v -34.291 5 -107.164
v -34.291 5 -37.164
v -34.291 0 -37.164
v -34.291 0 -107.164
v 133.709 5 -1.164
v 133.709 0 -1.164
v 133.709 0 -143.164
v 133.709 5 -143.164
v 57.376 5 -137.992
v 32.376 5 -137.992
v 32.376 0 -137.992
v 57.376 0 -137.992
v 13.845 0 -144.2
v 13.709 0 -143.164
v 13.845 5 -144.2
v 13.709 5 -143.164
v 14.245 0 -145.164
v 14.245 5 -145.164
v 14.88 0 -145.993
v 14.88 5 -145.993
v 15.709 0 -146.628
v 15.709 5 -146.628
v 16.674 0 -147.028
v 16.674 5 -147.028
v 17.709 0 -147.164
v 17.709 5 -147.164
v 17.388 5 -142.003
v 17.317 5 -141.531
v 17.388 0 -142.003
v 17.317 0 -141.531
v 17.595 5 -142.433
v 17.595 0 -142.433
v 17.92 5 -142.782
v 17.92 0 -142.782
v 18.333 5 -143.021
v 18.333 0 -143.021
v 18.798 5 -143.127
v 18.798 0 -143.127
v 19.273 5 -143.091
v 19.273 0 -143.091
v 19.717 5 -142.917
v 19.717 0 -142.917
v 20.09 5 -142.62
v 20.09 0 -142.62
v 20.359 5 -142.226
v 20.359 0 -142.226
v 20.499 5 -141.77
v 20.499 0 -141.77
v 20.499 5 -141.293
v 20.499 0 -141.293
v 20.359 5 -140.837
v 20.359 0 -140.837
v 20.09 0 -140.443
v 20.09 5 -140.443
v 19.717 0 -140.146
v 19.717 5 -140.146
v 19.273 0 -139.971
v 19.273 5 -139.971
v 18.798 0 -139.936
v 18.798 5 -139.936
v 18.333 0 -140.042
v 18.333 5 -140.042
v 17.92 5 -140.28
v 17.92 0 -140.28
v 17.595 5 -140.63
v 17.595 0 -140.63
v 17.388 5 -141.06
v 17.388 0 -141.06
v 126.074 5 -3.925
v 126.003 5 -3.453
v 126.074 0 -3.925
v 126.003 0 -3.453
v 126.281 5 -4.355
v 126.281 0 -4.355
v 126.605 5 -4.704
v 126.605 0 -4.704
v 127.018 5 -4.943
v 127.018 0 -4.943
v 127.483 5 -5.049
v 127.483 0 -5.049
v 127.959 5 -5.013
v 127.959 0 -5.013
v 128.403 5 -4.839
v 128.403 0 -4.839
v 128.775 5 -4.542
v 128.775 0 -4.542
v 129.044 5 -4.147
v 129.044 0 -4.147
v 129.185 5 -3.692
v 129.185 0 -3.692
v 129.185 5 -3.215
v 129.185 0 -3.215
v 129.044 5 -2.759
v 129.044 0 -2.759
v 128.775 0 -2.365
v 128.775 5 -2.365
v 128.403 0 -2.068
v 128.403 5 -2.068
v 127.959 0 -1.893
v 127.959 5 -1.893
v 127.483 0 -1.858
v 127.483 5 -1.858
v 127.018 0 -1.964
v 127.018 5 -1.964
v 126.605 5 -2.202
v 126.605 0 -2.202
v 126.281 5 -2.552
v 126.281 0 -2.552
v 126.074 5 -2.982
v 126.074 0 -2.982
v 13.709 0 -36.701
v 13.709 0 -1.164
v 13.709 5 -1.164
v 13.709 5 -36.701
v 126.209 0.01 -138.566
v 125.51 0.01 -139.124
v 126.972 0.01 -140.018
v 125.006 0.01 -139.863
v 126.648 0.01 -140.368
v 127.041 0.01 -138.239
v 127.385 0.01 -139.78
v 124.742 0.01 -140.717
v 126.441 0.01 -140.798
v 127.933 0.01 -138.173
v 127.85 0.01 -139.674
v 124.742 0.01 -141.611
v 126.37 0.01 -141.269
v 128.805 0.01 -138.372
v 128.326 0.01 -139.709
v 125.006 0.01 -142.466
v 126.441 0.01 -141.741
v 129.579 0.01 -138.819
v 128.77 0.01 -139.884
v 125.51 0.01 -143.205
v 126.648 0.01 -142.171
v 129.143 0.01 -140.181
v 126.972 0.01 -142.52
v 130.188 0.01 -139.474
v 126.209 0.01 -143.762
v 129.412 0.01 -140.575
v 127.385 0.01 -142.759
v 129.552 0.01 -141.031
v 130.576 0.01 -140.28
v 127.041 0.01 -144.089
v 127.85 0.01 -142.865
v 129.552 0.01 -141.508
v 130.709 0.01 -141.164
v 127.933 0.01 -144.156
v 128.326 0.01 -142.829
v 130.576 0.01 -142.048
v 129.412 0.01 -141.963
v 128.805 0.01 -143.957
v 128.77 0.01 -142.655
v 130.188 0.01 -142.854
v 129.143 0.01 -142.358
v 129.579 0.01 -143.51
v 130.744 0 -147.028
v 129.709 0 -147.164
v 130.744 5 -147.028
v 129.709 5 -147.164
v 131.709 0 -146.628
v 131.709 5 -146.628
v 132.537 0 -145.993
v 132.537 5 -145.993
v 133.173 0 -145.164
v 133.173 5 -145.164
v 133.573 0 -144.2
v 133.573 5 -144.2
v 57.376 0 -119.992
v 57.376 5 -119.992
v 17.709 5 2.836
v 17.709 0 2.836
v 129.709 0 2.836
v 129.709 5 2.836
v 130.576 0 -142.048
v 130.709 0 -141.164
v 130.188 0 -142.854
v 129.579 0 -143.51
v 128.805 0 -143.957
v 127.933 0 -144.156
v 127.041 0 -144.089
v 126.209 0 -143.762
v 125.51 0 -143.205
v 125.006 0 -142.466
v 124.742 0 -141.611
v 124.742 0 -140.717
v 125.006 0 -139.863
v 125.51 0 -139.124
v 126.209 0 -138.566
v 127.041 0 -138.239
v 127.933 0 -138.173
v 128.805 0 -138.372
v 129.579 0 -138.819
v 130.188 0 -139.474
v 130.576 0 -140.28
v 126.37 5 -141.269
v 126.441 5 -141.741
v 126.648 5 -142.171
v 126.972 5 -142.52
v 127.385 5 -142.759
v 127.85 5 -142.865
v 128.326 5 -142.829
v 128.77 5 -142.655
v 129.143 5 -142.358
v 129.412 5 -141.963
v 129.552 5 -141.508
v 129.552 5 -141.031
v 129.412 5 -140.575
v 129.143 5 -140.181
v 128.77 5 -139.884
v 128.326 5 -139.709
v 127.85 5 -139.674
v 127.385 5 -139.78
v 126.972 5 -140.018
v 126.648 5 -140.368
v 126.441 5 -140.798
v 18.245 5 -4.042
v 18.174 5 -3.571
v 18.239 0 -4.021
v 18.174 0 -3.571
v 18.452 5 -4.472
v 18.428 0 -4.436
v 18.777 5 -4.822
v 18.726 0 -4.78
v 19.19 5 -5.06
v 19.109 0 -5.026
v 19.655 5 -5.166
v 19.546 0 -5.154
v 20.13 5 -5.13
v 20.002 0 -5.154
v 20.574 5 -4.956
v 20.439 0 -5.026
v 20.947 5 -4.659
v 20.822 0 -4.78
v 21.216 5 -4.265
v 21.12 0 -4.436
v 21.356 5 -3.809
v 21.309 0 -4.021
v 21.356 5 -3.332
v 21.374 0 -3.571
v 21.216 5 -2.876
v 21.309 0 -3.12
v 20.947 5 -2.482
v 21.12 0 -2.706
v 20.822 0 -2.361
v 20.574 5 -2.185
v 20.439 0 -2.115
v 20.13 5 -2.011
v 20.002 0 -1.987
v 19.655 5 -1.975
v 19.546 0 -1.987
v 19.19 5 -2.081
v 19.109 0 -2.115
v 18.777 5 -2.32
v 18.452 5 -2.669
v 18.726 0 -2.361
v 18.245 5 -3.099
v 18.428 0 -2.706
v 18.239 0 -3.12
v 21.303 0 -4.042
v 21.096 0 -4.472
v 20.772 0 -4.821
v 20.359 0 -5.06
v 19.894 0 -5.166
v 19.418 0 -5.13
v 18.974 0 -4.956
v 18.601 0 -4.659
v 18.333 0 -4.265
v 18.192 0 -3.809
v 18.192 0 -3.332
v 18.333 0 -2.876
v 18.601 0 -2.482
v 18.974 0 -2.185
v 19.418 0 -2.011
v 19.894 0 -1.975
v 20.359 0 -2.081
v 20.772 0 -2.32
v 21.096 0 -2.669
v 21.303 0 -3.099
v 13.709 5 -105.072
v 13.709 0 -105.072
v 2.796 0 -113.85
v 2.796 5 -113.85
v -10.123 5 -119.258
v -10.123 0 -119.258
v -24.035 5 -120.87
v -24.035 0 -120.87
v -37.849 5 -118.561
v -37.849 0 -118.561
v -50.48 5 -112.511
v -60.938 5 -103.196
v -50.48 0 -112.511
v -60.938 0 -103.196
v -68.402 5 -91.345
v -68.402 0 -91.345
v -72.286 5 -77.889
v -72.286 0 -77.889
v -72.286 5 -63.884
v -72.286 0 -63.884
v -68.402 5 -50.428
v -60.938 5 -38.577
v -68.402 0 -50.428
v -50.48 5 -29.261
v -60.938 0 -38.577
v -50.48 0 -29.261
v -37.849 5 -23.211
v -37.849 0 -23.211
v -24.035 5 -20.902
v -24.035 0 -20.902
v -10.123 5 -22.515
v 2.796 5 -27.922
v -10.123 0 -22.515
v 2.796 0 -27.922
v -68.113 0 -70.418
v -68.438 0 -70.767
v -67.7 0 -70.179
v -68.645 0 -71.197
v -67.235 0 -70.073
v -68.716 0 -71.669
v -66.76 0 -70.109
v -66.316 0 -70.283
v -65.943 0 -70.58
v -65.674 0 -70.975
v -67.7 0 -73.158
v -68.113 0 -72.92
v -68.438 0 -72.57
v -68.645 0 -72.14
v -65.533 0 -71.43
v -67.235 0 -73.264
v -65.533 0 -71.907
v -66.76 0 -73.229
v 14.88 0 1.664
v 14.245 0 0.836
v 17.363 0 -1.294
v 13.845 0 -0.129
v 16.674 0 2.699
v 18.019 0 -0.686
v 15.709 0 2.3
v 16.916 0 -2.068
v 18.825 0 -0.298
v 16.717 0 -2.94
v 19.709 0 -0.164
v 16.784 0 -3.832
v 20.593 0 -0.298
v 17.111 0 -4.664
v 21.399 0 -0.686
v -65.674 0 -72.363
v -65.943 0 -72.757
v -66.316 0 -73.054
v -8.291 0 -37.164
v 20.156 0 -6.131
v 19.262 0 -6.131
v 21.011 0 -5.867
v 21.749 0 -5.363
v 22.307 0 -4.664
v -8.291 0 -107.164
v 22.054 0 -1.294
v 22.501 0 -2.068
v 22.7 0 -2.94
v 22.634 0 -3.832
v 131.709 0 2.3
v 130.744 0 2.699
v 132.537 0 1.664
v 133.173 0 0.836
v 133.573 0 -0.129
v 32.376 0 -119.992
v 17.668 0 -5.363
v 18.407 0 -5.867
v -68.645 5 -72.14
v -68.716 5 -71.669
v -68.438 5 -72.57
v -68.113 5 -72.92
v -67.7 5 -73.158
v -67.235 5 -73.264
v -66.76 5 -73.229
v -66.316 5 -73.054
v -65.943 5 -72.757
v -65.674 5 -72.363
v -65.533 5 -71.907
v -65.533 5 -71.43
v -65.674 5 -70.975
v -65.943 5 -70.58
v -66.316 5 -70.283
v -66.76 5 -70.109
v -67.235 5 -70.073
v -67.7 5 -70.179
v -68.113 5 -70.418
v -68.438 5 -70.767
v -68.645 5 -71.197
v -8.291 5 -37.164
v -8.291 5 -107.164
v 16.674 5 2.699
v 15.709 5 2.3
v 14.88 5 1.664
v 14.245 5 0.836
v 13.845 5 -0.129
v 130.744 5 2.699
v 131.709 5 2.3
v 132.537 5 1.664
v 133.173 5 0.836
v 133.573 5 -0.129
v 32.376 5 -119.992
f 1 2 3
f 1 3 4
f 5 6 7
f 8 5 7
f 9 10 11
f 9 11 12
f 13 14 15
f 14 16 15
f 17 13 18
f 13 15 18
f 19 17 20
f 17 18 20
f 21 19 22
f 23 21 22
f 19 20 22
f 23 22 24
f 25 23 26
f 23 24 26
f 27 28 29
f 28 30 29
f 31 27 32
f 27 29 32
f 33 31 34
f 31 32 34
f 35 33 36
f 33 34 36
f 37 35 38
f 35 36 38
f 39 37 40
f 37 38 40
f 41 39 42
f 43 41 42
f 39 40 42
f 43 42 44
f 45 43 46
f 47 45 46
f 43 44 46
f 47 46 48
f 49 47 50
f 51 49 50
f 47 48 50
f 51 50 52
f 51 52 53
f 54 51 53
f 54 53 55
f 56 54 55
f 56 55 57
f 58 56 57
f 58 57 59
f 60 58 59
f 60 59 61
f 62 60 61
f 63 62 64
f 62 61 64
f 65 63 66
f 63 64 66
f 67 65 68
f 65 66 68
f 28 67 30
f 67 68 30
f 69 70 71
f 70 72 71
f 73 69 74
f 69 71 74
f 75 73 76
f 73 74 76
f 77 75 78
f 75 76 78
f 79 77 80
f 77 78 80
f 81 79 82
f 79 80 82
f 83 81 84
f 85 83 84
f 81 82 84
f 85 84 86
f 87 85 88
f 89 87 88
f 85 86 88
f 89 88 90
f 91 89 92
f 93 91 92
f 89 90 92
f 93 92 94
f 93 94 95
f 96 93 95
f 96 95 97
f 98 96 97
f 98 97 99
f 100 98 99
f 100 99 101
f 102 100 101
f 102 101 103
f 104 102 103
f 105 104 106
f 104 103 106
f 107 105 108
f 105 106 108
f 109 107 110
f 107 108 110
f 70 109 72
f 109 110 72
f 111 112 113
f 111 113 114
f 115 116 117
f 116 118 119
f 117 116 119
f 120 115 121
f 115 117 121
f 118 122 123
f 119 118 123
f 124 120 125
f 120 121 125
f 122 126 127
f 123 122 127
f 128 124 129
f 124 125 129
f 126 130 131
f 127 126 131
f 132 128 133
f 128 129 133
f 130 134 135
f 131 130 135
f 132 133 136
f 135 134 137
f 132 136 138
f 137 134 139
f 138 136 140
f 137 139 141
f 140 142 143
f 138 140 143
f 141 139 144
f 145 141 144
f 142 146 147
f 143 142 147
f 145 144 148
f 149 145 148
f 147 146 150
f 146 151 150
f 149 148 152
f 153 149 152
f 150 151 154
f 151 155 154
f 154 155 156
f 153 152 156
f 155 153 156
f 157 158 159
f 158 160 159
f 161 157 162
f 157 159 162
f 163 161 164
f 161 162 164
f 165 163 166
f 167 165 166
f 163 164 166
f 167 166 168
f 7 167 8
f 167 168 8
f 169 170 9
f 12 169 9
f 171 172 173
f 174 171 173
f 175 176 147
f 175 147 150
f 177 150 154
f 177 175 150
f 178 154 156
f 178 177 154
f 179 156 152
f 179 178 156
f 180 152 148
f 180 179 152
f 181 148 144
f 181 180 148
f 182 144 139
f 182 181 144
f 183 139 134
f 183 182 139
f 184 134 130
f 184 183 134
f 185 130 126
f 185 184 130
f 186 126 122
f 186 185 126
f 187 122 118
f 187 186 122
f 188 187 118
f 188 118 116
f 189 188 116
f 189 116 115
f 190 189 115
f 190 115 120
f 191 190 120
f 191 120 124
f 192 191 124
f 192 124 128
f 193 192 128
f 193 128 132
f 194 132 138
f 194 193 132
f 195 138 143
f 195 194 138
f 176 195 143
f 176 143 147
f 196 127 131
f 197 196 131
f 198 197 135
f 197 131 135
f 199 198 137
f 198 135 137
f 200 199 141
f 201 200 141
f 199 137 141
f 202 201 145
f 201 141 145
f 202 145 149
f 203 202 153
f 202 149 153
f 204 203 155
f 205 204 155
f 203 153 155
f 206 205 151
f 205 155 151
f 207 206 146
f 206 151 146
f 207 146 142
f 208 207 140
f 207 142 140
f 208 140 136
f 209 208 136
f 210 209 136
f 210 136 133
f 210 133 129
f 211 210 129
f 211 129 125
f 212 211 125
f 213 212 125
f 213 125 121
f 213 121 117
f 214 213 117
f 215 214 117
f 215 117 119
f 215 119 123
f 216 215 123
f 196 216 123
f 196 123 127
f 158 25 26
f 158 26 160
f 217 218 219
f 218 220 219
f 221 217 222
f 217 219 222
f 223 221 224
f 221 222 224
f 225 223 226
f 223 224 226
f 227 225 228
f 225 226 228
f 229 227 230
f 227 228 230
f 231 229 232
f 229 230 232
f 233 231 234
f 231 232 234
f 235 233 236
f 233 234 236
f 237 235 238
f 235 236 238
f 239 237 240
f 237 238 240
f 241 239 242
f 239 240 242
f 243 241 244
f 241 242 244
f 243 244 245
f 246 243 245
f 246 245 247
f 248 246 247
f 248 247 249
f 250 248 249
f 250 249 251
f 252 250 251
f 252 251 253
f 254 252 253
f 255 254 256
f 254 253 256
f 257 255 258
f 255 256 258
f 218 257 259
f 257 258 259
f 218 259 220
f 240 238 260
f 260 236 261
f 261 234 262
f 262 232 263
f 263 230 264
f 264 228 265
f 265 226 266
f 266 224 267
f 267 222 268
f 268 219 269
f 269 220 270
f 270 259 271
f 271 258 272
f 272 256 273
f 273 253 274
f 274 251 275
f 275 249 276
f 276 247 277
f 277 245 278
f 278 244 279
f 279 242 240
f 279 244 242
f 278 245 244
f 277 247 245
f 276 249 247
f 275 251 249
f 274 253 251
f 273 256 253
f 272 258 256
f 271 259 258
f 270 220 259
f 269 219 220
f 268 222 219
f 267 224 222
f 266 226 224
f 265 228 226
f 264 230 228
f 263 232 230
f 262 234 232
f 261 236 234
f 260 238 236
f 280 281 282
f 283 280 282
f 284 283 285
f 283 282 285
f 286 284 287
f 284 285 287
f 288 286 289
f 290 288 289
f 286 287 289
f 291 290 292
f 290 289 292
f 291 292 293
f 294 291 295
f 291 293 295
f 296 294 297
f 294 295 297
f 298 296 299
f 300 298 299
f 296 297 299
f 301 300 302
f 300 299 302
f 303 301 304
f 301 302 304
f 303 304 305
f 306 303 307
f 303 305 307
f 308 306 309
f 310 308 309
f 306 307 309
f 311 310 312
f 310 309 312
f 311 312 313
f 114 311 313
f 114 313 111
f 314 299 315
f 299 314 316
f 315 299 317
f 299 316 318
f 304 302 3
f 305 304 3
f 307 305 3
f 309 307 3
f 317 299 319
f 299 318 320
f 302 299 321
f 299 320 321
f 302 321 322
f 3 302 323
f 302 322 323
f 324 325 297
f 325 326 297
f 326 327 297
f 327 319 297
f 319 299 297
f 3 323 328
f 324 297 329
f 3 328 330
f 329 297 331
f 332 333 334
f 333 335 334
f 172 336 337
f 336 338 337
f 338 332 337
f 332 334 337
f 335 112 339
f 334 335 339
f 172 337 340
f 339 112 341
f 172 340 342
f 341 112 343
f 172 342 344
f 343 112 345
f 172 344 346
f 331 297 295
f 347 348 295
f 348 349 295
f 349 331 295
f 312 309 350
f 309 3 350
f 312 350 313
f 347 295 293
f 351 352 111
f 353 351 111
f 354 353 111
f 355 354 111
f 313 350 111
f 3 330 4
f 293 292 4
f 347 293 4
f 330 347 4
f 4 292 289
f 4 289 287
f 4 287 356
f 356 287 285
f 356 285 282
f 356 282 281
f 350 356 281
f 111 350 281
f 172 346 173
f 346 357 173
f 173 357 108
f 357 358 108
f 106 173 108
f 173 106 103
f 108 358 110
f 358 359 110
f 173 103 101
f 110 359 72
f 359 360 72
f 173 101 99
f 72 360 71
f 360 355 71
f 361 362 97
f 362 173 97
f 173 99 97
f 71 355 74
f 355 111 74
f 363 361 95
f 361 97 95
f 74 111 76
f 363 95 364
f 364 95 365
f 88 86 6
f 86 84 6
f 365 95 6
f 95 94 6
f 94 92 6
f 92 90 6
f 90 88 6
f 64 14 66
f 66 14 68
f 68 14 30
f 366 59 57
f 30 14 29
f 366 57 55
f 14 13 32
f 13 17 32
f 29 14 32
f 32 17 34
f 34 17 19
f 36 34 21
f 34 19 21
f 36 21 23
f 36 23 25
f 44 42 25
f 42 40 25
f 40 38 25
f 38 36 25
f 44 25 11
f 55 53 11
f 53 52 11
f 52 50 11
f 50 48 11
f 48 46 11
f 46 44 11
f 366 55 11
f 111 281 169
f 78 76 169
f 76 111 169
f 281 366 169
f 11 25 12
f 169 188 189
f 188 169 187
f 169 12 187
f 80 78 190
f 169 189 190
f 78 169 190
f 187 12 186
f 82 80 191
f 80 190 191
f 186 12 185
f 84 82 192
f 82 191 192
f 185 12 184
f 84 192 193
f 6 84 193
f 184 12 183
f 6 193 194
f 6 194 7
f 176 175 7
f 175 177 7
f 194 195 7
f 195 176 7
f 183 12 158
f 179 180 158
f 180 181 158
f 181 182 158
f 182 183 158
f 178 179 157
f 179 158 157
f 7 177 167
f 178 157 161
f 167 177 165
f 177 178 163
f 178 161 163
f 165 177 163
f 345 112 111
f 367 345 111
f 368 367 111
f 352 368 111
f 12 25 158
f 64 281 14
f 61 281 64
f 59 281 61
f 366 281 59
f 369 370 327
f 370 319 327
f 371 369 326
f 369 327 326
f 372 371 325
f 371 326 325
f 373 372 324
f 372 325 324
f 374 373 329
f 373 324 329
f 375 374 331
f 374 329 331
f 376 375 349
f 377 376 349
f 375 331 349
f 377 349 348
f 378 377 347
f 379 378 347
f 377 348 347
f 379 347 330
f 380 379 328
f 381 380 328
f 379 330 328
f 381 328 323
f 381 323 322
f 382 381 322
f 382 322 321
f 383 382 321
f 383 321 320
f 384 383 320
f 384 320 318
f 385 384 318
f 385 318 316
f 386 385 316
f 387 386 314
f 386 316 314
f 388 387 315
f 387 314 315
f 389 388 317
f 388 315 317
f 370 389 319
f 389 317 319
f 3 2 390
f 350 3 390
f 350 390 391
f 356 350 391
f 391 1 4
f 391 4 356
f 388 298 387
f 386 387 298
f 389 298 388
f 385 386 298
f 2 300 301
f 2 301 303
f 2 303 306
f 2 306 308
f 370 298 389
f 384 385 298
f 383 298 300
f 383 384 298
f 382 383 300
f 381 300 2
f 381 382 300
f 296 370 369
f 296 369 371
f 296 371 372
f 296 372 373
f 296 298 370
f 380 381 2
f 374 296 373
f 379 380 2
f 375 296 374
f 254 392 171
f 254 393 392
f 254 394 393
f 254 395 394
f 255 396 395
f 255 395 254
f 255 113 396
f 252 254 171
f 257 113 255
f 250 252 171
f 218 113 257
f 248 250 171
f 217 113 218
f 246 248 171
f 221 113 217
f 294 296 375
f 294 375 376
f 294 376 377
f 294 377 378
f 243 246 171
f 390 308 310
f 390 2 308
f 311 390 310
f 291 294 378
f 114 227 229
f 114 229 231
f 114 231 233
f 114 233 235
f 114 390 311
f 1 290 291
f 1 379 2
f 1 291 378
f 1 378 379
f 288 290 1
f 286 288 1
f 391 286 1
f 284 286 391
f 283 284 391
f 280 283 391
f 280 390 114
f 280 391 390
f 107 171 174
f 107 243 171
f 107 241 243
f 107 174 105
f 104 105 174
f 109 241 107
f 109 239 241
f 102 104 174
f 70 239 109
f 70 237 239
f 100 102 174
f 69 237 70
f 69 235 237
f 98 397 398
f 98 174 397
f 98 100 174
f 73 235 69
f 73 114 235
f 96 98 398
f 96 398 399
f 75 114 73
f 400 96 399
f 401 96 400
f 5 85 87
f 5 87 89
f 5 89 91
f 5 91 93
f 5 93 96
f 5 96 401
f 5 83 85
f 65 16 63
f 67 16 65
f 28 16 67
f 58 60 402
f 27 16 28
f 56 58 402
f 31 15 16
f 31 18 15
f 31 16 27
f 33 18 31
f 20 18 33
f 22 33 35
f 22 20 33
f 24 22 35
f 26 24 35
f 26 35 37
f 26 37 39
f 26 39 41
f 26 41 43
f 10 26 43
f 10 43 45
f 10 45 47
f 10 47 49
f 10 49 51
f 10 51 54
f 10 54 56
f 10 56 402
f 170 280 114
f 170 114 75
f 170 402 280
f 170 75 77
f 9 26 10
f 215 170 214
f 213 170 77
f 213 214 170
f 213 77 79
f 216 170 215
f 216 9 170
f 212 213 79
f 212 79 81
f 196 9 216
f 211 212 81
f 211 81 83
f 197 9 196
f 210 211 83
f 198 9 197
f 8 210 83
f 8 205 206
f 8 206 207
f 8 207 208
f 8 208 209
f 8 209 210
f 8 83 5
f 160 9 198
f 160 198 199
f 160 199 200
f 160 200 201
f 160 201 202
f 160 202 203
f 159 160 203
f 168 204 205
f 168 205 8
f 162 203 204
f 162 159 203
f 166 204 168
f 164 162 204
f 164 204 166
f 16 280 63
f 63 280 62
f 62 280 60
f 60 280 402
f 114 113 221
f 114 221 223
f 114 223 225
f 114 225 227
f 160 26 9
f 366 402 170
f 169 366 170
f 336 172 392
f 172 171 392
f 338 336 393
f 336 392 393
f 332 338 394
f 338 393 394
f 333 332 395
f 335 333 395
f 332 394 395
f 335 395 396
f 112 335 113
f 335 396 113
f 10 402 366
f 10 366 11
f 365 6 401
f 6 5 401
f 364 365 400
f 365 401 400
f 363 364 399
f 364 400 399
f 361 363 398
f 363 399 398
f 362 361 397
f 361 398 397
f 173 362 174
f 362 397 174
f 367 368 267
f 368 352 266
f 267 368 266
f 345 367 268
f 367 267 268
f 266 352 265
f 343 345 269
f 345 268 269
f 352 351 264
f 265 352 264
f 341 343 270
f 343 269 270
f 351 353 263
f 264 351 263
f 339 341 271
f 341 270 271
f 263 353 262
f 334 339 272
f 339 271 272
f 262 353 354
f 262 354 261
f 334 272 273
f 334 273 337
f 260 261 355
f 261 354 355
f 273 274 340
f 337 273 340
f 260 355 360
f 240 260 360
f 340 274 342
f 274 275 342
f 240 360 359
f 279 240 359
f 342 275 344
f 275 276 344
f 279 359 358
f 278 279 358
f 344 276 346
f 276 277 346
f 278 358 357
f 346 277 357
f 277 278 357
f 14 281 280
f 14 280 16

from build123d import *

# Parameters (mm, degrees)
SKETCH8_W                           = 120
SKETCH8_H                           = 150
BOSS_EXTRUDE3_DEPTH                 = 5
SKETCH9_R                           = 50
BOSS_EXTRUDE4_DEPTH                 = 5
BOSS_EXTRUDE8_DEPTH                 = 3
BOSS_EXTRUDE8_DEPTH_BACK            = 0.0001
SKETCH29_R                          = 3
CUT_EXTRUDE9_OUTLINE_R              = 3
CUT_EXTRUDE9_DEPTH                  = 0.01
F_7_32_0_21875_DIAMETER_HOLE1_D     = 3.2
F_7_32_0_21875_DIAMETER_HOLE1_DEPTH = 5
F_7_32_0_21875_DIAMETER_HOLE1_TIP   = 0.96137699
FILLET3_R                           = 4
SKETCH38_W                          = 26
SKETCH38_H                          = 70
CUT_EXTRUDE10_DEPTH                 = 40
SKETCH39_W                          = 25
SKETCH39_H                          = 18
CUT_EXTRUDE11_DEPTH                 = 40


# Read off the part's stored shape, not the designer's step: Cut-Extrude9
with BuildPart() as part:
    # Sketch8 → Boss-Extrude3 (new body)
    with BuildSketch(Plane(origin=(0, 0, 0), x_dir=(1, 0, 0), z_dir=(0, 1, 0))):
        with Locations((73.708855083, 72.164227744)):
            Rectangle(SKETCH8_W, SKETCH8_H)
    extrude(amount=BOSS_EXTRUDE3_DEPTH)

    # Sketch9 → Boss-Extrude4 (add)
    with BuildSketch(Plane(origin=(0, 0, 0), x_dir=(1, 0, 0), z_dir=(0, 1, 0))):
        with Locations((-22.779007595, 70.886233868)):
            Circle(SKETCH9_R)
    extrude(amount=BOSS_EXTRUDE4_DEPTH)

    # Sketch29 → Boss-Extrude8 (add, two sides: drawn at the far end of the back side and taken through both)
    with BuildSketch(Plane(origin=(0, 0, 0), x_dir=(1, 0, 0), z_dir=(0, 1, 0)).offset(-BOSS_EXTRUDE8_DEPTH_BACK)):
        with Locations(Location((19.708855083, 3.164227744, 0), (0, 0, 270))):
            Circle(SKETCH29_R)
    extrude(amount=BOSS_EXTRUDE8_DEPTH + BOSS_EXTRUDE8_DEPTH_BACK)

    # Cut-Extrude9 outline → Cut-Extrude9 (cut)
    with BuildSketch(Plane(origin=(0, 0, 0), x_dir=(1, 0, 0), z_dir=(0, 1, 0))):
        with Locations((127.708855083, 141.164227744)):
            Circle(CUT_EXTRUDE9_OUTLINE_R)
    extrude(amount=CUT_EXTRUDE9_DEPTH, mode=Mode.SUBTRACT)

    # 7/32 (0.21875) Diameter Hole1
    with Locations(Plane(origin=(0, 5, 0), x_dir=(1, 0, 0), z_dir=(0, 1, 0))):
        with Locations((18.917123201, 141.531370062), (127.969984407, 141.269223761), (127.602547564, 3.45328248), (19.774147178, 3.570575466), (-67.115618064, 71.668740496)):
            Hole(F_7_32_0_21875_DIAMETER_HOLE1_D / 2, depth=F_7_32_0_21875_DIAMETER_HOLE1_DEPTH)
            with Locations((0, 0, -(F_7_32_0_21875_DIAMETER_HOLE1_DEPTH + F_7_32_0_21875_DIAMETER_HOLE1_TIP / 2))):  # 118° drill point
                Cone(0, F_7_32_0_21875_DIAMETER_HOLE1_D / 2, F_7_32_0_21875_DIAMETER_HOLE1_TIP, mode=Mode.SUBTRACT)

    # Fillet3
    fillet3_edges = [part.edges().sort_by_distance(p)[0] for p in [
        (13.708855083, 2.5, -147.164227744),
        (133.708855083, 2.5, -147.164227744),
        (133.708855083, 2.5, 2.835772256),
        (13.708855083, 2.5, 2.835772256),
    ]]
    fillet(fillet3_edges, radius=FILLET3_R)

    # Sketch38 → Cut-Extrude10 (cut)
    with BuildSketch(Plane(origin=(0, 5, 0), x_dir=(1, 0, 0), z_dir=(0, 1, 0))):
        with Locations((-21.291144917, 72.164227744)):
            Rectangle(SKETCH38_W, SKETCH38_H)
    extrude(amount=-CUT_EXTRUDE10_DEPTH, mode=Mode.SUBTRACT)

    # Sketch39 → Cut-Extrude11 (cut)
    with BuildSketch(Plane(origin=(0, 5, 0), x_dir=(1, 0, 0), z_dir=(0, 1, 0))):
        with Locations((44.875898376, 128.991672485)):
            Rectangle(SKETCH39_W, SKETCH39_H)
    extrude(amount=-CUT_EXTRUDE11_DEPTH, mode=Mode.SUBTRACT)


solid = part.part
